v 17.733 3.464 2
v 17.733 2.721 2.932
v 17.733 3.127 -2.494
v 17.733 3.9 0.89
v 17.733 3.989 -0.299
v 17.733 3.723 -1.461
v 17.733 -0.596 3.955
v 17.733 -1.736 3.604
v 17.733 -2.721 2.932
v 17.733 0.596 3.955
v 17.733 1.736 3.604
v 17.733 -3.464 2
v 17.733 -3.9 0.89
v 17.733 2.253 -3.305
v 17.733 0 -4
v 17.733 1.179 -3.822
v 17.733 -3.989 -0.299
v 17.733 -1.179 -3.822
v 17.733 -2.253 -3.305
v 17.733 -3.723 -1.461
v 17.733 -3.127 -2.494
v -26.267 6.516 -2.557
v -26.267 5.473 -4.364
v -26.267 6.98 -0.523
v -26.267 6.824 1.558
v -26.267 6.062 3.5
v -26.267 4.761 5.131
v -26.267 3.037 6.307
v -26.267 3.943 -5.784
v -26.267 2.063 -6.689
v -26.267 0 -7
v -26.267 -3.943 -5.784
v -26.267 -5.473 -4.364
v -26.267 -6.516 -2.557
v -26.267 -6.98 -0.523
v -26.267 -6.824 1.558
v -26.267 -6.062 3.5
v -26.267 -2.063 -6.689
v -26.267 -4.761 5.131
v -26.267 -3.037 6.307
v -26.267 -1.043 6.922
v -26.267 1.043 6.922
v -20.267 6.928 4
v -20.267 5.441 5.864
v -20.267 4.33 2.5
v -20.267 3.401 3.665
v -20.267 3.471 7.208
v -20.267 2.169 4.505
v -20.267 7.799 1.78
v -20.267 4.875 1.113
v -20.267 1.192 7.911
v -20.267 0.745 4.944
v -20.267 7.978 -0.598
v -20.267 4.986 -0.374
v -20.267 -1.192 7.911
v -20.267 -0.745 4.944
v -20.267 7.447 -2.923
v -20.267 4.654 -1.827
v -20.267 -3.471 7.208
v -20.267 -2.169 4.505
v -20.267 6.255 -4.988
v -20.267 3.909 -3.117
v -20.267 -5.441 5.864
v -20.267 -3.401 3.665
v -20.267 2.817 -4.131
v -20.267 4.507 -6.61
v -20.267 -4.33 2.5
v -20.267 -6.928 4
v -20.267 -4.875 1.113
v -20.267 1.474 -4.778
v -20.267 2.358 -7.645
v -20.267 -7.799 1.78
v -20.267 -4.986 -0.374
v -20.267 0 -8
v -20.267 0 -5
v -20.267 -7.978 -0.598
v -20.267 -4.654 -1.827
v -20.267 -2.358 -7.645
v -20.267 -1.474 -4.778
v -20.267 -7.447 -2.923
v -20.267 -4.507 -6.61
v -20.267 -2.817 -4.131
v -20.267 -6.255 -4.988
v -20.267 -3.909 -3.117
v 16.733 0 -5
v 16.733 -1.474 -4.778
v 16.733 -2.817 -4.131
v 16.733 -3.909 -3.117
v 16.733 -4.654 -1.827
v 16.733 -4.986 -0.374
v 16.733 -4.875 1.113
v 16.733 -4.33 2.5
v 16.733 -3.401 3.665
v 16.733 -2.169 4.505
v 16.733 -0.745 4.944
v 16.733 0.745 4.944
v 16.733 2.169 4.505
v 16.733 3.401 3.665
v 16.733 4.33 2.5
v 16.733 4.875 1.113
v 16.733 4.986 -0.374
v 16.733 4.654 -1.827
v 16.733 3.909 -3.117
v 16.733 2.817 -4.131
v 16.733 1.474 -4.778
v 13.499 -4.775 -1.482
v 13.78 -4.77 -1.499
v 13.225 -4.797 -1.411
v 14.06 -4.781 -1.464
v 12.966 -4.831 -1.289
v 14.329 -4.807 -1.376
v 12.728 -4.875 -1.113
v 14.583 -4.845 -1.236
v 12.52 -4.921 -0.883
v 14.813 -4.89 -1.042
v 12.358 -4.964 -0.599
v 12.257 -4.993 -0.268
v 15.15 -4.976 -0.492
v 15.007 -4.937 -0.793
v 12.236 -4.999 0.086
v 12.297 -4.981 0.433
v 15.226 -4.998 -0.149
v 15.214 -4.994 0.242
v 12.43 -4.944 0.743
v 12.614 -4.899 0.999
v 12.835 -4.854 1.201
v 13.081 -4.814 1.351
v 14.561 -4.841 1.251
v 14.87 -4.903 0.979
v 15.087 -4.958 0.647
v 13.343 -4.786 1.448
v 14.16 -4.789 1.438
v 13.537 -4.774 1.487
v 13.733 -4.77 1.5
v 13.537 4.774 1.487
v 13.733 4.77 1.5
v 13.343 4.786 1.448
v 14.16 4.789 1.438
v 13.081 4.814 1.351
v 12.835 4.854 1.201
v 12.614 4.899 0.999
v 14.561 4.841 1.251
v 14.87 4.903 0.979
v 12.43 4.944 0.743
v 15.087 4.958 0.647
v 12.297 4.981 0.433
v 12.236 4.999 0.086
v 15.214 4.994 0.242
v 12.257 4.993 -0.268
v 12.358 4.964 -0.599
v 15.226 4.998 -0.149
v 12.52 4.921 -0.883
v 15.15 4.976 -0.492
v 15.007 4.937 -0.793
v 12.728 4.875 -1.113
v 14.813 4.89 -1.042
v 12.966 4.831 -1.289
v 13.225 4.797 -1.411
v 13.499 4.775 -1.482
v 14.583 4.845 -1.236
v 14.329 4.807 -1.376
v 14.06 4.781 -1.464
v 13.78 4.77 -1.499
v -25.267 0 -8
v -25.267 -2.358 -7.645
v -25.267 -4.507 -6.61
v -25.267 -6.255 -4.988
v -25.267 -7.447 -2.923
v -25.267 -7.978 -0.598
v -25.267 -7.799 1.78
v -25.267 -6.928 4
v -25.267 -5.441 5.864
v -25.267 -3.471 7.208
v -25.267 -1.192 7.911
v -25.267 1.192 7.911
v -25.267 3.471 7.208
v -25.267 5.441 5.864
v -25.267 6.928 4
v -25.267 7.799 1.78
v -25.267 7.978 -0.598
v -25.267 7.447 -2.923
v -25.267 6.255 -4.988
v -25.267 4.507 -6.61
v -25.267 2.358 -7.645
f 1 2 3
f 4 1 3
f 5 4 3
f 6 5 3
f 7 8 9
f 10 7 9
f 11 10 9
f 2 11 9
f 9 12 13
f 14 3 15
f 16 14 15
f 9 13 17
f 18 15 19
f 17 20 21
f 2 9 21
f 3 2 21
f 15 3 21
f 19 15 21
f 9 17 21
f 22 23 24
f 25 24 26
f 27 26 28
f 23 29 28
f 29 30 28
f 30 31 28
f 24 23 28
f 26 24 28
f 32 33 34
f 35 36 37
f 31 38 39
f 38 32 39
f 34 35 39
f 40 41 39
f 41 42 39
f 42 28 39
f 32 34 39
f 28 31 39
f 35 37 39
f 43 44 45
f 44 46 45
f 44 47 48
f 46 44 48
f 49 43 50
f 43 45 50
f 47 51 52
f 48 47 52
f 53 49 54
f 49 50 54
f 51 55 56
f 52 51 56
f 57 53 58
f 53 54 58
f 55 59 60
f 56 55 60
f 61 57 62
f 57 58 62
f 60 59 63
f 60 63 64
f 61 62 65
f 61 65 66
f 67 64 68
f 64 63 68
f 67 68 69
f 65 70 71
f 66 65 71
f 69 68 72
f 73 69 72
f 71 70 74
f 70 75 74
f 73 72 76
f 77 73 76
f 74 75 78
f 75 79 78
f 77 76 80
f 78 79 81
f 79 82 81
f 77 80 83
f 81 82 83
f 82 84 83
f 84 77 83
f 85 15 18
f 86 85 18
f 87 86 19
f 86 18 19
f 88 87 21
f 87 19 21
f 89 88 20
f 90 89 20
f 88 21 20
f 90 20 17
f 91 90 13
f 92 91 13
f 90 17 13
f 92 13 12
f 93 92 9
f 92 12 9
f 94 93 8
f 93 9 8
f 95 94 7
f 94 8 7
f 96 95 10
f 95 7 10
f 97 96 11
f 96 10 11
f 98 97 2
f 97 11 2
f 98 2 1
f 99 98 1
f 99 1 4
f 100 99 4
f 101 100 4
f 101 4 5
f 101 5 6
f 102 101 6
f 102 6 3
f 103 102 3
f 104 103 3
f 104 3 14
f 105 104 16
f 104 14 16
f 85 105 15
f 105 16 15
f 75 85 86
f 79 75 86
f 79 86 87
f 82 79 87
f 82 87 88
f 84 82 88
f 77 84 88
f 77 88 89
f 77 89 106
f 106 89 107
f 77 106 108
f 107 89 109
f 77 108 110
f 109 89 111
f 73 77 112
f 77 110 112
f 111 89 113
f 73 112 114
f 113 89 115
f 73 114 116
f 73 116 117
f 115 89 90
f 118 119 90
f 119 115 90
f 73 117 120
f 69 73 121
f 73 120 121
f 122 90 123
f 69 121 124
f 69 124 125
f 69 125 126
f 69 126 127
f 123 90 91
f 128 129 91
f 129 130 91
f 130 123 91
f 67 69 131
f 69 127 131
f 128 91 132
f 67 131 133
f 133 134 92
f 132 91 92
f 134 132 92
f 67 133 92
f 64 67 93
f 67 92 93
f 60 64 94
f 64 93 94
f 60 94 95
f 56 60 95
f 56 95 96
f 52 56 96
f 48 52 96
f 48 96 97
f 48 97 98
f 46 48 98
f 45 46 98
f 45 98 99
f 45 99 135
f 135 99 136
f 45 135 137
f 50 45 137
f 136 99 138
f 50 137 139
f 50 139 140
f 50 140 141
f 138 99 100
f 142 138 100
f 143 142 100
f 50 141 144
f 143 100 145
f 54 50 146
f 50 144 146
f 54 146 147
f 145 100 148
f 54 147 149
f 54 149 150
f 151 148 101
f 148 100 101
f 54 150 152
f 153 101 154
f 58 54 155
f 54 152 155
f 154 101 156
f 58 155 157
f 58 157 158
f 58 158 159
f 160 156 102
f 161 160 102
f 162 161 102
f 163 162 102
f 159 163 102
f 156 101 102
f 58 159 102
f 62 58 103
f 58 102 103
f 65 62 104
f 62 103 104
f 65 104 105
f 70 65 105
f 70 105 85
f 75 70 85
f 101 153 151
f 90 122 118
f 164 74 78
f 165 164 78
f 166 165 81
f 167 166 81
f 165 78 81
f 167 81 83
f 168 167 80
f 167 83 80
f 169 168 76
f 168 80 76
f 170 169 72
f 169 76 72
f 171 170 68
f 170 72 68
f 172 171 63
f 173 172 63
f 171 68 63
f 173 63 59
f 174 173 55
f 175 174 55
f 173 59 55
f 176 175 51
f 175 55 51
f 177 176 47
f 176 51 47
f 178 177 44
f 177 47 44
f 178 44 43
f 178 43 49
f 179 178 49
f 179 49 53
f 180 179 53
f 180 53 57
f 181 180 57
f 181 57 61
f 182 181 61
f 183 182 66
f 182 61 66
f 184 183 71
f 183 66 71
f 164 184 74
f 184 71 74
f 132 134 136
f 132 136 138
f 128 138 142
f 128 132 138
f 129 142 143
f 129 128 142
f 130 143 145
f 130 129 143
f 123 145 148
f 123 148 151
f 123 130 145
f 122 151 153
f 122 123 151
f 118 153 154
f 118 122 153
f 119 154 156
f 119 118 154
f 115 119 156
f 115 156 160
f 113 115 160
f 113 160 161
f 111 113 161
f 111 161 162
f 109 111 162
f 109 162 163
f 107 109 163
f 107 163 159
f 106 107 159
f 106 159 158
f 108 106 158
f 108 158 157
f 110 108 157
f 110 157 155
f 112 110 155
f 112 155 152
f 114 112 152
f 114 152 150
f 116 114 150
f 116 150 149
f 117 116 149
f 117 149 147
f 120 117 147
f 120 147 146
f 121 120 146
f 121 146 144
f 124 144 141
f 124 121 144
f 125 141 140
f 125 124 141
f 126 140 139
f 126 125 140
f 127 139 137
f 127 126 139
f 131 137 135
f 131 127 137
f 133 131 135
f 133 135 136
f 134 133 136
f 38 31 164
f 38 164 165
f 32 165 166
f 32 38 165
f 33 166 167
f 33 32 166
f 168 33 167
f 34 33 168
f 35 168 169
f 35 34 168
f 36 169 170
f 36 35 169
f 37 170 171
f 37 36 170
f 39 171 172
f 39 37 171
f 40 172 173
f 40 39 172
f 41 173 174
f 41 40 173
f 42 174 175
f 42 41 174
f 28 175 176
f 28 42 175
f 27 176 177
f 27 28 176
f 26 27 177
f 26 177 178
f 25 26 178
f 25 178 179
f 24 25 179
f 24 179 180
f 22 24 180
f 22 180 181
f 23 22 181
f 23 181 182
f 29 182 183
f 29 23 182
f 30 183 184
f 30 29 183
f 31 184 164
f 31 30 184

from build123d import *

# Parameters (mm, degrees)
CHAMFER_1_SIZE           = 1
CHAMFER_2_SIZE           = 1
CUT_EXTRUDE_2_DEPTH      = 29.599611497
CUT_EXTRUDE_2_DEPTH_BACK = 29.599611497
SKETCH_2_R               = 1.5


with BuildPart() as part:
    # 草图1 → 旋转1 (revolve)
    with BuildSketch(Plane.XY, mode=Mode.PRIVATE) as revolve_1_sk:
        Polygon((-26.266666667, 0), (-26.266666667, 8), (-20.266666667, 8), (-20.266666667, 5), (17.733333333, 5), (17.733333333, 0), align=None)
    revolve(revolve_1_sk.sketch.rotate(Axis((0, 0, 0), (-1, 0, 0)), 90), axis=Axis((0, 0, 0), (-1, 0, 0)))

    # 倒角1
    chamfer_1_edges = [part.edges().sort_by_distance(p)[0] for p in [
        (17.733333333, 0, 5),
    ]]
    chamfer(chamfer_1_edges, length=CHAMFER_1_SIZE)

    # 倒角2
    chamfer_2_edges = [part.edges().sort_by_distance(p)[0] for p in [
        (-26.266666667, 0, 8),
    ]]
    chamfer(chamfer_2_edges, length=CHAMFER_2_SIZE)

    # 草图2 → 切除-拉伸2 (cut, two sides: drawn at the far end of the back side and taken through both)
    with BuildSketch(Plane(origin=(0, 0, 0), x_dir=(1, 0, 0), z_dir=(0, 1, 0)).offset(-CUT_EXTRUDE_2_DEPTH_BACK)):
        with Locations(Location((13.733333333, 0, 0), (0, 0, 270))):
            Circle(SKETCH_2_R)
    extrude(amount=CUT_EXTRUDE_2_DEPTH + CUT_EXTRUDE_2_DEPTH_BACK, mode=Mode.SUBTRACT)


solid = part.part
